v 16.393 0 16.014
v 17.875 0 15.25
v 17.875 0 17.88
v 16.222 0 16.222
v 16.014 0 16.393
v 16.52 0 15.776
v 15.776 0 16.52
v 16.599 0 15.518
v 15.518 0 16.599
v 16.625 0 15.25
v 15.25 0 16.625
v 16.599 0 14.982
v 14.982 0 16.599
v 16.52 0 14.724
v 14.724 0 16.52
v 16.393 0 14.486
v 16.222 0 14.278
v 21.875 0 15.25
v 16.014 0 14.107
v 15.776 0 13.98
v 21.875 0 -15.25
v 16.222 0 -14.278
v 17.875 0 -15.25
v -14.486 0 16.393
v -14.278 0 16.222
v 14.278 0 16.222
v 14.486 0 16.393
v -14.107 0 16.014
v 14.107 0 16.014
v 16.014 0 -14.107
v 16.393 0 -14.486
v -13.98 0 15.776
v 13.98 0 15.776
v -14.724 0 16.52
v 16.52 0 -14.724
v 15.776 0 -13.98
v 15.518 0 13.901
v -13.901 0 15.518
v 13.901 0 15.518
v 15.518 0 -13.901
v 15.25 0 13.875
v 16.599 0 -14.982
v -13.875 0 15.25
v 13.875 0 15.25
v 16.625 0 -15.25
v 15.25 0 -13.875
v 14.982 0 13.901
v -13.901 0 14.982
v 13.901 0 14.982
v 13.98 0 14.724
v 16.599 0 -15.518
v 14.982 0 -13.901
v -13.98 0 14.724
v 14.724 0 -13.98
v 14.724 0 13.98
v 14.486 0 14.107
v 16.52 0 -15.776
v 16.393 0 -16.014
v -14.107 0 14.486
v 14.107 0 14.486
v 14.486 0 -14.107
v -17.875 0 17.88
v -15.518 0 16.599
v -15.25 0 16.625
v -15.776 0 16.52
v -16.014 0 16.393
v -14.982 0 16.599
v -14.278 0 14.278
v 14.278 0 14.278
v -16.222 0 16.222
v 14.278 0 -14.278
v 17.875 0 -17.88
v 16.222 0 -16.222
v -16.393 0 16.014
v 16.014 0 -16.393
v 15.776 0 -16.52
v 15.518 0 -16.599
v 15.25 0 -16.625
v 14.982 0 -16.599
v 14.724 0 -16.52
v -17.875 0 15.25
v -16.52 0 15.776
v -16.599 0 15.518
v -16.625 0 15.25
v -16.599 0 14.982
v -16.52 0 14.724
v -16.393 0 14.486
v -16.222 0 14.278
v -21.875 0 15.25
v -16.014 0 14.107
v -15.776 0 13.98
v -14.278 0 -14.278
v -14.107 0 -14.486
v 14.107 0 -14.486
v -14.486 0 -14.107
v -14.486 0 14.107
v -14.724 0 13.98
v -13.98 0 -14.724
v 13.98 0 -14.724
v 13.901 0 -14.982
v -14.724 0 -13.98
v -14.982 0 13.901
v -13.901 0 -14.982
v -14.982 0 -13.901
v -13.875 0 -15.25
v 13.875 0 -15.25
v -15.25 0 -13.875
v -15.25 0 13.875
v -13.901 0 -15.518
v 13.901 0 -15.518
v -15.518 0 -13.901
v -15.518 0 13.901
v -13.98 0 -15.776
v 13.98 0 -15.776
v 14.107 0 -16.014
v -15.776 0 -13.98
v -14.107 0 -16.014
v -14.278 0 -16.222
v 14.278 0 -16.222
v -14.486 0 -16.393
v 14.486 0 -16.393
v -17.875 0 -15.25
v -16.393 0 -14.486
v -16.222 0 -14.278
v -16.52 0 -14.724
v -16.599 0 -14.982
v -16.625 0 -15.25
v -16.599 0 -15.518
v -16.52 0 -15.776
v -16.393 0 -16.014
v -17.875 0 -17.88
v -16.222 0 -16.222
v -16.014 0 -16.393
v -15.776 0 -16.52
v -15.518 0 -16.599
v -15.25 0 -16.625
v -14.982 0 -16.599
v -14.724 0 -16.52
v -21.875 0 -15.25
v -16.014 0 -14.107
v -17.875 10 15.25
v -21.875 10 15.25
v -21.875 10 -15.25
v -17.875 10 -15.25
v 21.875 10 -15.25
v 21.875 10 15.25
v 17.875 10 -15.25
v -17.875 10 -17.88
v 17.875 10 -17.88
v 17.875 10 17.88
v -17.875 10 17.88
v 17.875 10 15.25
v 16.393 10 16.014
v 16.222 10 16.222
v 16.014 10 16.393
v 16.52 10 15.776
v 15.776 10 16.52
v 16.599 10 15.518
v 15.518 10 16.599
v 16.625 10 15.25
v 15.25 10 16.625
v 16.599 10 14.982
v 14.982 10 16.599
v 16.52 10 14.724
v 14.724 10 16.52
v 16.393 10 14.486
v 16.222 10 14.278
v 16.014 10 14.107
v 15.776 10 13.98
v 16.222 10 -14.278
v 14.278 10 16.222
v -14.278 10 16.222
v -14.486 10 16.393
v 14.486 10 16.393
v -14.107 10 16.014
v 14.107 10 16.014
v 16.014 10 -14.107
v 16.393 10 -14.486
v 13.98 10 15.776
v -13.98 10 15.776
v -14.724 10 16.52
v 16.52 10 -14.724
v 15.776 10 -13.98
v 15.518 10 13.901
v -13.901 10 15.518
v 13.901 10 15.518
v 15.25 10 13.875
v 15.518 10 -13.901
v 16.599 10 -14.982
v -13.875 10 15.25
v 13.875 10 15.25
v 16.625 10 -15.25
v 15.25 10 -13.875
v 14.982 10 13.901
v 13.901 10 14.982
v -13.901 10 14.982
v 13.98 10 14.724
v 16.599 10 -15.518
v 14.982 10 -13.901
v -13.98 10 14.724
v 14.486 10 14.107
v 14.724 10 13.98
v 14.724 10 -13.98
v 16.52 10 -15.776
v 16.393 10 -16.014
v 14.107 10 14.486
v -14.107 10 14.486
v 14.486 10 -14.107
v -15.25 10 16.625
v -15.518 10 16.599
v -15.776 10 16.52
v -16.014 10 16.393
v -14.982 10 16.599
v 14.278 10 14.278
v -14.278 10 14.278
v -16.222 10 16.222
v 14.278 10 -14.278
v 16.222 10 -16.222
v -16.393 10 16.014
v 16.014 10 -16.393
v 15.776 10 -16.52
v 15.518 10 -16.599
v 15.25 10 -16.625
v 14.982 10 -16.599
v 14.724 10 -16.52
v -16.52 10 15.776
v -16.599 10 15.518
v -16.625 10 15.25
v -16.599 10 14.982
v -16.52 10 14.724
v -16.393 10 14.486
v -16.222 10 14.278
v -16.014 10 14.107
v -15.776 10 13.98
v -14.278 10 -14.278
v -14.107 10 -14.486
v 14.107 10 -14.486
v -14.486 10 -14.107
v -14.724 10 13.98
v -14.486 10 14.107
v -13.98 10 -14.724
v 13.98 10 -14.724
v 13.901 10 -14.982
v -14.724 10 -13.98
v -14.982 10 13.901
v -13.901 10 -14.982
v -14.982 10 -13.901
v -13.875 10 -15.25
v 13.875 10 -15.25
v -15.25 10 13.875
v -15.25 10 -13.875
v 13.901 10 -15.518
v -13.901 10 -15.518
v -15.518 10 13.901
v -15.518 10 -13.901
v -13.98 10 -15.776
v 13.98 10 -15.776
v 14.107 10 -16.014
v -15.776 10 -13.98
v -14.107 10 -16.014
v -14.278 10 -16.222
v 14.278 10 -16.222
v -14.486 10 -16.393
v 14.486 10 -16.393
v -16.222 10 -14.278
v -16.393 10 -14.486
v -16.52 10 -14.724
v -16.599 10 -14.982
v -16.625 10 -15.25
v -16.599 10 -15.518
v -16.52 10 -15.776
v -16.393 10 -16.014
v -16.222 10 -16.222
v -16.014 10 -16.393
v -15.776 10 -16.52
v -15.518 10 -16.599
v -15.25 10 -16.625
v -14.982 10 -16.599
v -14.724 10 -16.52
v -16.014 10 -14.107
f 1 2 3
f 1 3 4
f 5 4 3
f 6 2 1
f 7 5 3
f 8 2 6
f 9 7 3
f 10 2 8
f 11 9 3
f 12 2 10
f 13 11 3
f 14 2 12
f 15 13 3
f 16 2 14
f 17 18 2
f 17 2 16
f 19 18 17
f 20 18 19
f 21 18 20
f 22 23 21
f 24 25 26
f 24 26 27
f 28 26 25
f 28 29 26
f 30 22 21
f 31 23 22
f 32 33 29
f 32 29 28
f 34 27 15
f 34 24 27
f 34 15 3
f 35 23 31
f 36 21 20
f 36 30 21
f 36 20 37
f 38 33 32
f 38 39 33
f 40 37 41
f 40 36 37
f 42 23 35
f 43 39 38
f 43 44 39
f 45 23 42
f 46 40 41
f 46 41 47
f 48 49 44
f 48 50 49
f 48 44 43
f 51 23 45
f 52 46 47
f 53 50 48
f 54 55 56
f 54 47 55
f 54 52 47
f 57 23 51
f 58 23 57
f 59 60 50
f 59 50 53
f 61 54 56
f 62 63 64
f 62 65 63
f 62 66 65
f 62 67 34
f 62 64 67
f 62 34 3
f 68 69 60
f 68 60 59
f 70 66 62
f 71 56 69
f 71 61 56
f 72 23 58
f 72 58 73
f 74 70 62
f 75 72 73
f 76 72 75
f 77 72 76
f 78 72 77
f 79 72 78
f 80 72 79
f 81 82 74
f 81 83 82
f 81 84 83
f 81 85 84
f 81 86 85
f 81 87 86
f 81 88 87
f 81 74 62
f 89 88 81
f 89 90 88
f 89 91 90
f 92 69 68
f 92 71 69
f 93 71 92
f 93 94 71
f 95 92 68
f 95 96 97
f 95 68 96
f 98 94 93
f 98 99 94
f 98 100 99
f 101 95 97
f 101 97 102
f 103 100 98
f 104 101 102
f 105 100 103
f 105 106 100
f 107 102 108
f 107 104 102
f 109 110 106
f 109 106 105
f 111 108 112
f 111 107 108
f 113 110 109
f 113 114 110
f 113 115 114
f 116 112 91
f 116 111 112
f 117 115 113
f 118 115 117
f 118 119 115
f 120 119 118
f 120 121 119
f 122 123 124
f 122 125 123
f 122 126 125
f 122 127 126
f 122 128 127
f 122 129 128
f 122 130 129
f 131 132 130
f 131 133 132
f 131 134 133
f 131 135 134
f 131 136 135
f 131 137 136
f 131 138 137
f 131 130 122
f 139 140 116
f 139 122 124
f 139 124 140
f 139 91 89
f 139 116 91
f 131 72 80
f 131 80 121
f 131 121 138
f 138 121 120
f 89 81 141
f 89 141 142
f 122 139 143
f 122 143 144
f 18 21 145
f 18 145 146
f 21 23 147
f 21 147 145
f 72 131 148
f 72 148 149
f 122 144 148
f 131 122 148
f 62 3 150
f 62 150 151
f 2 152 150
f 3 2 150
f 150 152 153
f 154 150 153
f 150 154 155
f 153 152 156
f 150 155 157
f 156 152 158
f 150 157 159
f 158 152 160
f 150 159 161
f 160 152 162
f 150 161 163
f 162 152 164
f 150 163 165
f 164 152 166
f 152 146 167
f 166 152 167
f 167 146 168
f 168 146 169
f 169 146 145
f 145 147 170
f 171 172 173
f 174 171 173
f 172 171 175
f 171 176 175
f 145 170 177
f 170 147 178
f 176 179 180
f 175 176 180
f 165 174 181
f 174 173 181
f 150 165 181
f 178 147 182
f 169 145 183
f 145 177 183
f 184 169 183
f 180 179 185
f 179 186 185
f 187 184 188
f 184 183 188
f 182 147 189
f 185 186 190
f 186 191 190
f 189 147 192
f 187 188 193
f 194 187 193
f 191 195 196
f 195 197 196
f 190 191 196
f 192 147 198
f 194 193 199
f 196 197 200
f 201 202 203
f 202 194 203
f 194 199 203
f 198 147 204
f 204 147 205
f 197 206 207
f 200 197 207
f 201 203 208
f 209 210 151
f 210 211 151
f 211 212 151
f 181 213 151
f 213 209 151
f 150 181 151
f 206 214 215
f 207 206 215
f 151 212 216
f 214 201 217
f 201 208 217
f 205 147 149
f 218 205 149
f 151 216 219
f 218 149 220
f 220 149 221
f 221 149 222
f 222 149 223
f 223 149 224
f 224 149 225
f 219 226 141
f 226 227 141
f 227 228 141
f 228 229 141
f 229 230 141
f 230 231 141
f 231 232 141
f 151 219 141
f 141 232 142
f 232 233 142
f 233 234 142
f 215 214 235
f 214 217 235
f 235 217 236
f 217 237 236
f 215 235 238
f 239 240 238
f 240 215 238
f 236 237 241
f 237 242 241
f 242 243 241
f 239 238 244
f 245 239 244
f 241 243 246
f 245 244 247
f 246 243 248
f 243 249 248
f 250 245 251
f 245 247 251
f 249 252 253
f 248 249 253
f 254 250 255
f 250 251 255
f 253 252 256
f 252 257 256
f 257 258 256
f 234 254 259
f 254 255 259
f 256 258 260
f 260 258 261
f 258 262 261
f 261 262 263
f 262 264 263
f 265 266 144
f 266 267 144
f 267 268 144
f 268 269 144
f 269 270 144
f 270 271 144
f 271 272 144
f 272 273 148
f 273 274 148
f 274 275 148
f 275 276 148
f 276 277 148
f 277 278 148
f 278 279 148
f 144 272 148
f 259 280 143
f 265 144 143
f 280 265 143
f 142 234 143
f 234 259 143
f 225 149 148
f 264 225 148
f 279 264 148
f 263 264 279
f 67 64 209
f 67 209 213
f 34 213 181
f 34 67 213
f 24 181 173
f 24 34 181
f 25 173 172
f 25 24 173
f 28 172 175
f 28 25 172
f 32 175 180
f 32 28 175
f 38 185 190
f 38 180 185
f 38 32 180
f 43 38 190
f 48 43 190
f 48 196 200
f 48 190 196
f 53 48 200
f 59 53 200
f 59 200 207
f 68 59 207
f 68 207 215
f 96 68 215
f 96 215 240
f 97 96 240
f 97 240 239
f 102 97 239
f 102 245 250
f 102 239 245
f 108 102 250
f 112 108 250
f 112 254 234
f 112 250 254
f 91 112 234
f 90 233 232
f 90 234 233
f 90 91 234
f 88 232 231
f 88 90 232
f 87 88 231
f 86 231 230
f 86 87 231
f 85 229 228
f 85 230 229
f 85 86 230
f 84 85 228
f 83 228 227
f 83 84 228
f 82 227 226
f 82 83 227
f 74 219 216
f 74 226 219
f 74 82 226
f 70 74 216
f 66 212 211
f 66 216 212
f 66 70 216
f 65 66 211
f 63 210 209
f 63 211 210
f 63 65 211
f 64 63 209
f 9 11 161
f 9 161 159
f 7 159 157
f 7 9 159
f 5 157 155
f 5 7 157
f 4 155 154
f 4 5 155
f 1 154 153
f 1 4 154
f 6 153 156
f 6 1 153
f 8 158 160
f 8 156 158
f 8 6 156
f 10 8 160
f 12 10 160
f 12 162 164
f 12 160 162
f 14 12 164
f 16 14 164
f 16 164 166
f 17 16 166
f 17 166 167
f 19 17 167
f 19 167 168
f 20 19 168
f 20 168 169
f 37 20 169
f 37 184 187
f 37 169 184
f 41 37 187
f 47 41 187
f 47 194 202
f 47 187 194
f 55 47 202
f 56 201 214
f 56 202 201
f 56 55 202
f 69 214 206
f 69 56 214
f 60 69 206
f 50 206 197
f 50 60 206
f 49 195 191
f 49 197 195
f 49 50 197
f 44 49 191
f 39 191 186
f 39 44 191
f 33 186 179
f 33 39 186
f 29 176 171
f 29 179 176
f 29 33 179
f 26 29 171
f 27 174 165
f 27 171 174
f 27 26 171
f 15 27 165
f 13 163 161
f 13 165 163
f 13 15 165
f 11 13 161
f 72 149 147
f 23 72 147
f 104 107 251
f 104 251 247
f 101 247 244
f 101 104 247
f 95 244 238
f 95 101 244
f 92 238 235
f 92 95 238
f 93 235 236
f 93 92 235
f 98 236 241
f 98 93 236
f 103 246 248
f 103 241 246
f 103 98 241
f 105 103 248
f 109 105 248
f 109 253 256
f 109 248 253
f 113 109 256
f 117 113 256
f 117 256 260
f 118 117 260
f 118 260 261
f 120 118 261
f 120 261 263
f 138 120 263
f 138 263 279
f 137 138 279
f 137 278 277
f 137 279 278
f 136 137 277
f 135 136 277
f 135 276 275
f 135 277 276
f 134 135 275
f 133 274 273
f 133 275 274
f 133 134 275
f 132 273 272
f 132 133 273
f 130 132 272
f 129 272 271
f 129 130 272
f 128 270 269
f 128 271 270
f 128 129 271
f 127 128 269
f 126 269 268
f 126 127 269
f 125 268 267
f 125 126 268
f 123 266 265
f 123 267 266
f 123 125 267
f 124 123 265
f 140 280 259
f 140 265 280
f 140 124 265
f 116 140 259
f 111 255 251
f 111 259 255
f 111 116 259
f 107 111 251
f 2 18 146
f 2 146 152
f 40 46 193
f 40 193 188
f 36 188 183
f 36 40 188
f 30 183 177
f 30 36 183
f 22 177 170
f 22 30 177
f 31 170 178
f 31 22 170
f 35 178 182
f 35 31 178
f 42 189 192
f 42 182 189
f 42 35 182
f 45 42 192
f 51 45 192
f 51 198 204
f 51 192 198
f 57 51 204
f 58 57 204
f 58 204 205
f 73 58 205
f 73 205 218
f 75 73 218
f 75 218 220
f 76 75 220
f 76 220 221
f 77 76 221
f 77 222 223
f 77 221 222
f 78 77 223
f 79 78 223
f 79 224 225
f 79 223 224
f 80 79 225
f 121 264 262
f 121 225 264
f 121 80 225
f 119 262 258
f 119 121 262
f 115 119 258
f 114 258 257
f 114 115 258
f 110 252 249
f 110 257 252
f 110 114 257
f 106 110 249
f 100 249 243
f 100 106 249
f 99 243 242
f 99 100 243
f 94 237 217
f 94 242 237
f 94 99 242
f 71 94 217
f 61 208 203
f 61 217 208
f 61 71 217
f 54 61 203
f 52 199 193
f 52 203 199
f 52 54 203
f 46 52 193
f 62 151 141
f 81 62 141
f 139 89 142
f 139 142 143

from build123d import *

# Parameters (mm, degrees)
BOSS_EXTRUDE1_DEPTH     = 10
CUT_EXTRUDE1_DEPTH      = 30.970152235
CUT_EXTRUDE1_DEPTH_BACK = 30.970152235
SKETCH1_R               = 1.375


with BuildPart() as part:
    # Sketch2 → Boss-Extrude1 (new body)
    with BuildSketch(Plane(origin=(0, 0, 0), x_dir=(1, 0, 0), z_dir=(0, 1, 0))):
        Polygon((17.875, 15.25), (21.875, 15.25), (21.875, -15.25), (17.875, -15.25), (17.875, -17.88), (-17.875, -17.88), (-17.875, -15.25), (-21.875, -15.25), (-21.875, 15.25), (-17.875, 15.25), (-17.875, 17.88), (17.875, 17.88), align=None)
    extrude(amount=BOSS_EXTRUDE1_DEPTH)

    # Sketch1 → Cut-Extrude1 (cut, two sides: drawn at the far end of the back side and taken through both)
    with BuildSketch(Plane(origin=(0, 0, 0), x_dir=(1, 0, 0), z_dir=(0, 1, 0)).offset(-CUT_EXTRUDE1_DEPTH_BACK)):
        with Locations(Location((-15.25, 15.25, 0), (0, 0, 270))):
            Circle(SKETCH1_R)
        with Locations(Location((15.25, 15.25, 0), (0, 0, 270))):
            Circle(SKETCH1_R)
        with Locations(Location((15.25, -15.25, 0), (0, 0, 270))):
            Circle(SKETCH1_R)
        with Locations(Location((-15.25, -15.25, 0), (0, 0, 270))):
            Circle(SKETCH1_R)
    extrude(amount=CUT_EXTRUDE1_DEPTH + CUT_EXTRUDE1_DEPTH_BACK, mode=Mode.SUBTRACT)


solid = part.part
